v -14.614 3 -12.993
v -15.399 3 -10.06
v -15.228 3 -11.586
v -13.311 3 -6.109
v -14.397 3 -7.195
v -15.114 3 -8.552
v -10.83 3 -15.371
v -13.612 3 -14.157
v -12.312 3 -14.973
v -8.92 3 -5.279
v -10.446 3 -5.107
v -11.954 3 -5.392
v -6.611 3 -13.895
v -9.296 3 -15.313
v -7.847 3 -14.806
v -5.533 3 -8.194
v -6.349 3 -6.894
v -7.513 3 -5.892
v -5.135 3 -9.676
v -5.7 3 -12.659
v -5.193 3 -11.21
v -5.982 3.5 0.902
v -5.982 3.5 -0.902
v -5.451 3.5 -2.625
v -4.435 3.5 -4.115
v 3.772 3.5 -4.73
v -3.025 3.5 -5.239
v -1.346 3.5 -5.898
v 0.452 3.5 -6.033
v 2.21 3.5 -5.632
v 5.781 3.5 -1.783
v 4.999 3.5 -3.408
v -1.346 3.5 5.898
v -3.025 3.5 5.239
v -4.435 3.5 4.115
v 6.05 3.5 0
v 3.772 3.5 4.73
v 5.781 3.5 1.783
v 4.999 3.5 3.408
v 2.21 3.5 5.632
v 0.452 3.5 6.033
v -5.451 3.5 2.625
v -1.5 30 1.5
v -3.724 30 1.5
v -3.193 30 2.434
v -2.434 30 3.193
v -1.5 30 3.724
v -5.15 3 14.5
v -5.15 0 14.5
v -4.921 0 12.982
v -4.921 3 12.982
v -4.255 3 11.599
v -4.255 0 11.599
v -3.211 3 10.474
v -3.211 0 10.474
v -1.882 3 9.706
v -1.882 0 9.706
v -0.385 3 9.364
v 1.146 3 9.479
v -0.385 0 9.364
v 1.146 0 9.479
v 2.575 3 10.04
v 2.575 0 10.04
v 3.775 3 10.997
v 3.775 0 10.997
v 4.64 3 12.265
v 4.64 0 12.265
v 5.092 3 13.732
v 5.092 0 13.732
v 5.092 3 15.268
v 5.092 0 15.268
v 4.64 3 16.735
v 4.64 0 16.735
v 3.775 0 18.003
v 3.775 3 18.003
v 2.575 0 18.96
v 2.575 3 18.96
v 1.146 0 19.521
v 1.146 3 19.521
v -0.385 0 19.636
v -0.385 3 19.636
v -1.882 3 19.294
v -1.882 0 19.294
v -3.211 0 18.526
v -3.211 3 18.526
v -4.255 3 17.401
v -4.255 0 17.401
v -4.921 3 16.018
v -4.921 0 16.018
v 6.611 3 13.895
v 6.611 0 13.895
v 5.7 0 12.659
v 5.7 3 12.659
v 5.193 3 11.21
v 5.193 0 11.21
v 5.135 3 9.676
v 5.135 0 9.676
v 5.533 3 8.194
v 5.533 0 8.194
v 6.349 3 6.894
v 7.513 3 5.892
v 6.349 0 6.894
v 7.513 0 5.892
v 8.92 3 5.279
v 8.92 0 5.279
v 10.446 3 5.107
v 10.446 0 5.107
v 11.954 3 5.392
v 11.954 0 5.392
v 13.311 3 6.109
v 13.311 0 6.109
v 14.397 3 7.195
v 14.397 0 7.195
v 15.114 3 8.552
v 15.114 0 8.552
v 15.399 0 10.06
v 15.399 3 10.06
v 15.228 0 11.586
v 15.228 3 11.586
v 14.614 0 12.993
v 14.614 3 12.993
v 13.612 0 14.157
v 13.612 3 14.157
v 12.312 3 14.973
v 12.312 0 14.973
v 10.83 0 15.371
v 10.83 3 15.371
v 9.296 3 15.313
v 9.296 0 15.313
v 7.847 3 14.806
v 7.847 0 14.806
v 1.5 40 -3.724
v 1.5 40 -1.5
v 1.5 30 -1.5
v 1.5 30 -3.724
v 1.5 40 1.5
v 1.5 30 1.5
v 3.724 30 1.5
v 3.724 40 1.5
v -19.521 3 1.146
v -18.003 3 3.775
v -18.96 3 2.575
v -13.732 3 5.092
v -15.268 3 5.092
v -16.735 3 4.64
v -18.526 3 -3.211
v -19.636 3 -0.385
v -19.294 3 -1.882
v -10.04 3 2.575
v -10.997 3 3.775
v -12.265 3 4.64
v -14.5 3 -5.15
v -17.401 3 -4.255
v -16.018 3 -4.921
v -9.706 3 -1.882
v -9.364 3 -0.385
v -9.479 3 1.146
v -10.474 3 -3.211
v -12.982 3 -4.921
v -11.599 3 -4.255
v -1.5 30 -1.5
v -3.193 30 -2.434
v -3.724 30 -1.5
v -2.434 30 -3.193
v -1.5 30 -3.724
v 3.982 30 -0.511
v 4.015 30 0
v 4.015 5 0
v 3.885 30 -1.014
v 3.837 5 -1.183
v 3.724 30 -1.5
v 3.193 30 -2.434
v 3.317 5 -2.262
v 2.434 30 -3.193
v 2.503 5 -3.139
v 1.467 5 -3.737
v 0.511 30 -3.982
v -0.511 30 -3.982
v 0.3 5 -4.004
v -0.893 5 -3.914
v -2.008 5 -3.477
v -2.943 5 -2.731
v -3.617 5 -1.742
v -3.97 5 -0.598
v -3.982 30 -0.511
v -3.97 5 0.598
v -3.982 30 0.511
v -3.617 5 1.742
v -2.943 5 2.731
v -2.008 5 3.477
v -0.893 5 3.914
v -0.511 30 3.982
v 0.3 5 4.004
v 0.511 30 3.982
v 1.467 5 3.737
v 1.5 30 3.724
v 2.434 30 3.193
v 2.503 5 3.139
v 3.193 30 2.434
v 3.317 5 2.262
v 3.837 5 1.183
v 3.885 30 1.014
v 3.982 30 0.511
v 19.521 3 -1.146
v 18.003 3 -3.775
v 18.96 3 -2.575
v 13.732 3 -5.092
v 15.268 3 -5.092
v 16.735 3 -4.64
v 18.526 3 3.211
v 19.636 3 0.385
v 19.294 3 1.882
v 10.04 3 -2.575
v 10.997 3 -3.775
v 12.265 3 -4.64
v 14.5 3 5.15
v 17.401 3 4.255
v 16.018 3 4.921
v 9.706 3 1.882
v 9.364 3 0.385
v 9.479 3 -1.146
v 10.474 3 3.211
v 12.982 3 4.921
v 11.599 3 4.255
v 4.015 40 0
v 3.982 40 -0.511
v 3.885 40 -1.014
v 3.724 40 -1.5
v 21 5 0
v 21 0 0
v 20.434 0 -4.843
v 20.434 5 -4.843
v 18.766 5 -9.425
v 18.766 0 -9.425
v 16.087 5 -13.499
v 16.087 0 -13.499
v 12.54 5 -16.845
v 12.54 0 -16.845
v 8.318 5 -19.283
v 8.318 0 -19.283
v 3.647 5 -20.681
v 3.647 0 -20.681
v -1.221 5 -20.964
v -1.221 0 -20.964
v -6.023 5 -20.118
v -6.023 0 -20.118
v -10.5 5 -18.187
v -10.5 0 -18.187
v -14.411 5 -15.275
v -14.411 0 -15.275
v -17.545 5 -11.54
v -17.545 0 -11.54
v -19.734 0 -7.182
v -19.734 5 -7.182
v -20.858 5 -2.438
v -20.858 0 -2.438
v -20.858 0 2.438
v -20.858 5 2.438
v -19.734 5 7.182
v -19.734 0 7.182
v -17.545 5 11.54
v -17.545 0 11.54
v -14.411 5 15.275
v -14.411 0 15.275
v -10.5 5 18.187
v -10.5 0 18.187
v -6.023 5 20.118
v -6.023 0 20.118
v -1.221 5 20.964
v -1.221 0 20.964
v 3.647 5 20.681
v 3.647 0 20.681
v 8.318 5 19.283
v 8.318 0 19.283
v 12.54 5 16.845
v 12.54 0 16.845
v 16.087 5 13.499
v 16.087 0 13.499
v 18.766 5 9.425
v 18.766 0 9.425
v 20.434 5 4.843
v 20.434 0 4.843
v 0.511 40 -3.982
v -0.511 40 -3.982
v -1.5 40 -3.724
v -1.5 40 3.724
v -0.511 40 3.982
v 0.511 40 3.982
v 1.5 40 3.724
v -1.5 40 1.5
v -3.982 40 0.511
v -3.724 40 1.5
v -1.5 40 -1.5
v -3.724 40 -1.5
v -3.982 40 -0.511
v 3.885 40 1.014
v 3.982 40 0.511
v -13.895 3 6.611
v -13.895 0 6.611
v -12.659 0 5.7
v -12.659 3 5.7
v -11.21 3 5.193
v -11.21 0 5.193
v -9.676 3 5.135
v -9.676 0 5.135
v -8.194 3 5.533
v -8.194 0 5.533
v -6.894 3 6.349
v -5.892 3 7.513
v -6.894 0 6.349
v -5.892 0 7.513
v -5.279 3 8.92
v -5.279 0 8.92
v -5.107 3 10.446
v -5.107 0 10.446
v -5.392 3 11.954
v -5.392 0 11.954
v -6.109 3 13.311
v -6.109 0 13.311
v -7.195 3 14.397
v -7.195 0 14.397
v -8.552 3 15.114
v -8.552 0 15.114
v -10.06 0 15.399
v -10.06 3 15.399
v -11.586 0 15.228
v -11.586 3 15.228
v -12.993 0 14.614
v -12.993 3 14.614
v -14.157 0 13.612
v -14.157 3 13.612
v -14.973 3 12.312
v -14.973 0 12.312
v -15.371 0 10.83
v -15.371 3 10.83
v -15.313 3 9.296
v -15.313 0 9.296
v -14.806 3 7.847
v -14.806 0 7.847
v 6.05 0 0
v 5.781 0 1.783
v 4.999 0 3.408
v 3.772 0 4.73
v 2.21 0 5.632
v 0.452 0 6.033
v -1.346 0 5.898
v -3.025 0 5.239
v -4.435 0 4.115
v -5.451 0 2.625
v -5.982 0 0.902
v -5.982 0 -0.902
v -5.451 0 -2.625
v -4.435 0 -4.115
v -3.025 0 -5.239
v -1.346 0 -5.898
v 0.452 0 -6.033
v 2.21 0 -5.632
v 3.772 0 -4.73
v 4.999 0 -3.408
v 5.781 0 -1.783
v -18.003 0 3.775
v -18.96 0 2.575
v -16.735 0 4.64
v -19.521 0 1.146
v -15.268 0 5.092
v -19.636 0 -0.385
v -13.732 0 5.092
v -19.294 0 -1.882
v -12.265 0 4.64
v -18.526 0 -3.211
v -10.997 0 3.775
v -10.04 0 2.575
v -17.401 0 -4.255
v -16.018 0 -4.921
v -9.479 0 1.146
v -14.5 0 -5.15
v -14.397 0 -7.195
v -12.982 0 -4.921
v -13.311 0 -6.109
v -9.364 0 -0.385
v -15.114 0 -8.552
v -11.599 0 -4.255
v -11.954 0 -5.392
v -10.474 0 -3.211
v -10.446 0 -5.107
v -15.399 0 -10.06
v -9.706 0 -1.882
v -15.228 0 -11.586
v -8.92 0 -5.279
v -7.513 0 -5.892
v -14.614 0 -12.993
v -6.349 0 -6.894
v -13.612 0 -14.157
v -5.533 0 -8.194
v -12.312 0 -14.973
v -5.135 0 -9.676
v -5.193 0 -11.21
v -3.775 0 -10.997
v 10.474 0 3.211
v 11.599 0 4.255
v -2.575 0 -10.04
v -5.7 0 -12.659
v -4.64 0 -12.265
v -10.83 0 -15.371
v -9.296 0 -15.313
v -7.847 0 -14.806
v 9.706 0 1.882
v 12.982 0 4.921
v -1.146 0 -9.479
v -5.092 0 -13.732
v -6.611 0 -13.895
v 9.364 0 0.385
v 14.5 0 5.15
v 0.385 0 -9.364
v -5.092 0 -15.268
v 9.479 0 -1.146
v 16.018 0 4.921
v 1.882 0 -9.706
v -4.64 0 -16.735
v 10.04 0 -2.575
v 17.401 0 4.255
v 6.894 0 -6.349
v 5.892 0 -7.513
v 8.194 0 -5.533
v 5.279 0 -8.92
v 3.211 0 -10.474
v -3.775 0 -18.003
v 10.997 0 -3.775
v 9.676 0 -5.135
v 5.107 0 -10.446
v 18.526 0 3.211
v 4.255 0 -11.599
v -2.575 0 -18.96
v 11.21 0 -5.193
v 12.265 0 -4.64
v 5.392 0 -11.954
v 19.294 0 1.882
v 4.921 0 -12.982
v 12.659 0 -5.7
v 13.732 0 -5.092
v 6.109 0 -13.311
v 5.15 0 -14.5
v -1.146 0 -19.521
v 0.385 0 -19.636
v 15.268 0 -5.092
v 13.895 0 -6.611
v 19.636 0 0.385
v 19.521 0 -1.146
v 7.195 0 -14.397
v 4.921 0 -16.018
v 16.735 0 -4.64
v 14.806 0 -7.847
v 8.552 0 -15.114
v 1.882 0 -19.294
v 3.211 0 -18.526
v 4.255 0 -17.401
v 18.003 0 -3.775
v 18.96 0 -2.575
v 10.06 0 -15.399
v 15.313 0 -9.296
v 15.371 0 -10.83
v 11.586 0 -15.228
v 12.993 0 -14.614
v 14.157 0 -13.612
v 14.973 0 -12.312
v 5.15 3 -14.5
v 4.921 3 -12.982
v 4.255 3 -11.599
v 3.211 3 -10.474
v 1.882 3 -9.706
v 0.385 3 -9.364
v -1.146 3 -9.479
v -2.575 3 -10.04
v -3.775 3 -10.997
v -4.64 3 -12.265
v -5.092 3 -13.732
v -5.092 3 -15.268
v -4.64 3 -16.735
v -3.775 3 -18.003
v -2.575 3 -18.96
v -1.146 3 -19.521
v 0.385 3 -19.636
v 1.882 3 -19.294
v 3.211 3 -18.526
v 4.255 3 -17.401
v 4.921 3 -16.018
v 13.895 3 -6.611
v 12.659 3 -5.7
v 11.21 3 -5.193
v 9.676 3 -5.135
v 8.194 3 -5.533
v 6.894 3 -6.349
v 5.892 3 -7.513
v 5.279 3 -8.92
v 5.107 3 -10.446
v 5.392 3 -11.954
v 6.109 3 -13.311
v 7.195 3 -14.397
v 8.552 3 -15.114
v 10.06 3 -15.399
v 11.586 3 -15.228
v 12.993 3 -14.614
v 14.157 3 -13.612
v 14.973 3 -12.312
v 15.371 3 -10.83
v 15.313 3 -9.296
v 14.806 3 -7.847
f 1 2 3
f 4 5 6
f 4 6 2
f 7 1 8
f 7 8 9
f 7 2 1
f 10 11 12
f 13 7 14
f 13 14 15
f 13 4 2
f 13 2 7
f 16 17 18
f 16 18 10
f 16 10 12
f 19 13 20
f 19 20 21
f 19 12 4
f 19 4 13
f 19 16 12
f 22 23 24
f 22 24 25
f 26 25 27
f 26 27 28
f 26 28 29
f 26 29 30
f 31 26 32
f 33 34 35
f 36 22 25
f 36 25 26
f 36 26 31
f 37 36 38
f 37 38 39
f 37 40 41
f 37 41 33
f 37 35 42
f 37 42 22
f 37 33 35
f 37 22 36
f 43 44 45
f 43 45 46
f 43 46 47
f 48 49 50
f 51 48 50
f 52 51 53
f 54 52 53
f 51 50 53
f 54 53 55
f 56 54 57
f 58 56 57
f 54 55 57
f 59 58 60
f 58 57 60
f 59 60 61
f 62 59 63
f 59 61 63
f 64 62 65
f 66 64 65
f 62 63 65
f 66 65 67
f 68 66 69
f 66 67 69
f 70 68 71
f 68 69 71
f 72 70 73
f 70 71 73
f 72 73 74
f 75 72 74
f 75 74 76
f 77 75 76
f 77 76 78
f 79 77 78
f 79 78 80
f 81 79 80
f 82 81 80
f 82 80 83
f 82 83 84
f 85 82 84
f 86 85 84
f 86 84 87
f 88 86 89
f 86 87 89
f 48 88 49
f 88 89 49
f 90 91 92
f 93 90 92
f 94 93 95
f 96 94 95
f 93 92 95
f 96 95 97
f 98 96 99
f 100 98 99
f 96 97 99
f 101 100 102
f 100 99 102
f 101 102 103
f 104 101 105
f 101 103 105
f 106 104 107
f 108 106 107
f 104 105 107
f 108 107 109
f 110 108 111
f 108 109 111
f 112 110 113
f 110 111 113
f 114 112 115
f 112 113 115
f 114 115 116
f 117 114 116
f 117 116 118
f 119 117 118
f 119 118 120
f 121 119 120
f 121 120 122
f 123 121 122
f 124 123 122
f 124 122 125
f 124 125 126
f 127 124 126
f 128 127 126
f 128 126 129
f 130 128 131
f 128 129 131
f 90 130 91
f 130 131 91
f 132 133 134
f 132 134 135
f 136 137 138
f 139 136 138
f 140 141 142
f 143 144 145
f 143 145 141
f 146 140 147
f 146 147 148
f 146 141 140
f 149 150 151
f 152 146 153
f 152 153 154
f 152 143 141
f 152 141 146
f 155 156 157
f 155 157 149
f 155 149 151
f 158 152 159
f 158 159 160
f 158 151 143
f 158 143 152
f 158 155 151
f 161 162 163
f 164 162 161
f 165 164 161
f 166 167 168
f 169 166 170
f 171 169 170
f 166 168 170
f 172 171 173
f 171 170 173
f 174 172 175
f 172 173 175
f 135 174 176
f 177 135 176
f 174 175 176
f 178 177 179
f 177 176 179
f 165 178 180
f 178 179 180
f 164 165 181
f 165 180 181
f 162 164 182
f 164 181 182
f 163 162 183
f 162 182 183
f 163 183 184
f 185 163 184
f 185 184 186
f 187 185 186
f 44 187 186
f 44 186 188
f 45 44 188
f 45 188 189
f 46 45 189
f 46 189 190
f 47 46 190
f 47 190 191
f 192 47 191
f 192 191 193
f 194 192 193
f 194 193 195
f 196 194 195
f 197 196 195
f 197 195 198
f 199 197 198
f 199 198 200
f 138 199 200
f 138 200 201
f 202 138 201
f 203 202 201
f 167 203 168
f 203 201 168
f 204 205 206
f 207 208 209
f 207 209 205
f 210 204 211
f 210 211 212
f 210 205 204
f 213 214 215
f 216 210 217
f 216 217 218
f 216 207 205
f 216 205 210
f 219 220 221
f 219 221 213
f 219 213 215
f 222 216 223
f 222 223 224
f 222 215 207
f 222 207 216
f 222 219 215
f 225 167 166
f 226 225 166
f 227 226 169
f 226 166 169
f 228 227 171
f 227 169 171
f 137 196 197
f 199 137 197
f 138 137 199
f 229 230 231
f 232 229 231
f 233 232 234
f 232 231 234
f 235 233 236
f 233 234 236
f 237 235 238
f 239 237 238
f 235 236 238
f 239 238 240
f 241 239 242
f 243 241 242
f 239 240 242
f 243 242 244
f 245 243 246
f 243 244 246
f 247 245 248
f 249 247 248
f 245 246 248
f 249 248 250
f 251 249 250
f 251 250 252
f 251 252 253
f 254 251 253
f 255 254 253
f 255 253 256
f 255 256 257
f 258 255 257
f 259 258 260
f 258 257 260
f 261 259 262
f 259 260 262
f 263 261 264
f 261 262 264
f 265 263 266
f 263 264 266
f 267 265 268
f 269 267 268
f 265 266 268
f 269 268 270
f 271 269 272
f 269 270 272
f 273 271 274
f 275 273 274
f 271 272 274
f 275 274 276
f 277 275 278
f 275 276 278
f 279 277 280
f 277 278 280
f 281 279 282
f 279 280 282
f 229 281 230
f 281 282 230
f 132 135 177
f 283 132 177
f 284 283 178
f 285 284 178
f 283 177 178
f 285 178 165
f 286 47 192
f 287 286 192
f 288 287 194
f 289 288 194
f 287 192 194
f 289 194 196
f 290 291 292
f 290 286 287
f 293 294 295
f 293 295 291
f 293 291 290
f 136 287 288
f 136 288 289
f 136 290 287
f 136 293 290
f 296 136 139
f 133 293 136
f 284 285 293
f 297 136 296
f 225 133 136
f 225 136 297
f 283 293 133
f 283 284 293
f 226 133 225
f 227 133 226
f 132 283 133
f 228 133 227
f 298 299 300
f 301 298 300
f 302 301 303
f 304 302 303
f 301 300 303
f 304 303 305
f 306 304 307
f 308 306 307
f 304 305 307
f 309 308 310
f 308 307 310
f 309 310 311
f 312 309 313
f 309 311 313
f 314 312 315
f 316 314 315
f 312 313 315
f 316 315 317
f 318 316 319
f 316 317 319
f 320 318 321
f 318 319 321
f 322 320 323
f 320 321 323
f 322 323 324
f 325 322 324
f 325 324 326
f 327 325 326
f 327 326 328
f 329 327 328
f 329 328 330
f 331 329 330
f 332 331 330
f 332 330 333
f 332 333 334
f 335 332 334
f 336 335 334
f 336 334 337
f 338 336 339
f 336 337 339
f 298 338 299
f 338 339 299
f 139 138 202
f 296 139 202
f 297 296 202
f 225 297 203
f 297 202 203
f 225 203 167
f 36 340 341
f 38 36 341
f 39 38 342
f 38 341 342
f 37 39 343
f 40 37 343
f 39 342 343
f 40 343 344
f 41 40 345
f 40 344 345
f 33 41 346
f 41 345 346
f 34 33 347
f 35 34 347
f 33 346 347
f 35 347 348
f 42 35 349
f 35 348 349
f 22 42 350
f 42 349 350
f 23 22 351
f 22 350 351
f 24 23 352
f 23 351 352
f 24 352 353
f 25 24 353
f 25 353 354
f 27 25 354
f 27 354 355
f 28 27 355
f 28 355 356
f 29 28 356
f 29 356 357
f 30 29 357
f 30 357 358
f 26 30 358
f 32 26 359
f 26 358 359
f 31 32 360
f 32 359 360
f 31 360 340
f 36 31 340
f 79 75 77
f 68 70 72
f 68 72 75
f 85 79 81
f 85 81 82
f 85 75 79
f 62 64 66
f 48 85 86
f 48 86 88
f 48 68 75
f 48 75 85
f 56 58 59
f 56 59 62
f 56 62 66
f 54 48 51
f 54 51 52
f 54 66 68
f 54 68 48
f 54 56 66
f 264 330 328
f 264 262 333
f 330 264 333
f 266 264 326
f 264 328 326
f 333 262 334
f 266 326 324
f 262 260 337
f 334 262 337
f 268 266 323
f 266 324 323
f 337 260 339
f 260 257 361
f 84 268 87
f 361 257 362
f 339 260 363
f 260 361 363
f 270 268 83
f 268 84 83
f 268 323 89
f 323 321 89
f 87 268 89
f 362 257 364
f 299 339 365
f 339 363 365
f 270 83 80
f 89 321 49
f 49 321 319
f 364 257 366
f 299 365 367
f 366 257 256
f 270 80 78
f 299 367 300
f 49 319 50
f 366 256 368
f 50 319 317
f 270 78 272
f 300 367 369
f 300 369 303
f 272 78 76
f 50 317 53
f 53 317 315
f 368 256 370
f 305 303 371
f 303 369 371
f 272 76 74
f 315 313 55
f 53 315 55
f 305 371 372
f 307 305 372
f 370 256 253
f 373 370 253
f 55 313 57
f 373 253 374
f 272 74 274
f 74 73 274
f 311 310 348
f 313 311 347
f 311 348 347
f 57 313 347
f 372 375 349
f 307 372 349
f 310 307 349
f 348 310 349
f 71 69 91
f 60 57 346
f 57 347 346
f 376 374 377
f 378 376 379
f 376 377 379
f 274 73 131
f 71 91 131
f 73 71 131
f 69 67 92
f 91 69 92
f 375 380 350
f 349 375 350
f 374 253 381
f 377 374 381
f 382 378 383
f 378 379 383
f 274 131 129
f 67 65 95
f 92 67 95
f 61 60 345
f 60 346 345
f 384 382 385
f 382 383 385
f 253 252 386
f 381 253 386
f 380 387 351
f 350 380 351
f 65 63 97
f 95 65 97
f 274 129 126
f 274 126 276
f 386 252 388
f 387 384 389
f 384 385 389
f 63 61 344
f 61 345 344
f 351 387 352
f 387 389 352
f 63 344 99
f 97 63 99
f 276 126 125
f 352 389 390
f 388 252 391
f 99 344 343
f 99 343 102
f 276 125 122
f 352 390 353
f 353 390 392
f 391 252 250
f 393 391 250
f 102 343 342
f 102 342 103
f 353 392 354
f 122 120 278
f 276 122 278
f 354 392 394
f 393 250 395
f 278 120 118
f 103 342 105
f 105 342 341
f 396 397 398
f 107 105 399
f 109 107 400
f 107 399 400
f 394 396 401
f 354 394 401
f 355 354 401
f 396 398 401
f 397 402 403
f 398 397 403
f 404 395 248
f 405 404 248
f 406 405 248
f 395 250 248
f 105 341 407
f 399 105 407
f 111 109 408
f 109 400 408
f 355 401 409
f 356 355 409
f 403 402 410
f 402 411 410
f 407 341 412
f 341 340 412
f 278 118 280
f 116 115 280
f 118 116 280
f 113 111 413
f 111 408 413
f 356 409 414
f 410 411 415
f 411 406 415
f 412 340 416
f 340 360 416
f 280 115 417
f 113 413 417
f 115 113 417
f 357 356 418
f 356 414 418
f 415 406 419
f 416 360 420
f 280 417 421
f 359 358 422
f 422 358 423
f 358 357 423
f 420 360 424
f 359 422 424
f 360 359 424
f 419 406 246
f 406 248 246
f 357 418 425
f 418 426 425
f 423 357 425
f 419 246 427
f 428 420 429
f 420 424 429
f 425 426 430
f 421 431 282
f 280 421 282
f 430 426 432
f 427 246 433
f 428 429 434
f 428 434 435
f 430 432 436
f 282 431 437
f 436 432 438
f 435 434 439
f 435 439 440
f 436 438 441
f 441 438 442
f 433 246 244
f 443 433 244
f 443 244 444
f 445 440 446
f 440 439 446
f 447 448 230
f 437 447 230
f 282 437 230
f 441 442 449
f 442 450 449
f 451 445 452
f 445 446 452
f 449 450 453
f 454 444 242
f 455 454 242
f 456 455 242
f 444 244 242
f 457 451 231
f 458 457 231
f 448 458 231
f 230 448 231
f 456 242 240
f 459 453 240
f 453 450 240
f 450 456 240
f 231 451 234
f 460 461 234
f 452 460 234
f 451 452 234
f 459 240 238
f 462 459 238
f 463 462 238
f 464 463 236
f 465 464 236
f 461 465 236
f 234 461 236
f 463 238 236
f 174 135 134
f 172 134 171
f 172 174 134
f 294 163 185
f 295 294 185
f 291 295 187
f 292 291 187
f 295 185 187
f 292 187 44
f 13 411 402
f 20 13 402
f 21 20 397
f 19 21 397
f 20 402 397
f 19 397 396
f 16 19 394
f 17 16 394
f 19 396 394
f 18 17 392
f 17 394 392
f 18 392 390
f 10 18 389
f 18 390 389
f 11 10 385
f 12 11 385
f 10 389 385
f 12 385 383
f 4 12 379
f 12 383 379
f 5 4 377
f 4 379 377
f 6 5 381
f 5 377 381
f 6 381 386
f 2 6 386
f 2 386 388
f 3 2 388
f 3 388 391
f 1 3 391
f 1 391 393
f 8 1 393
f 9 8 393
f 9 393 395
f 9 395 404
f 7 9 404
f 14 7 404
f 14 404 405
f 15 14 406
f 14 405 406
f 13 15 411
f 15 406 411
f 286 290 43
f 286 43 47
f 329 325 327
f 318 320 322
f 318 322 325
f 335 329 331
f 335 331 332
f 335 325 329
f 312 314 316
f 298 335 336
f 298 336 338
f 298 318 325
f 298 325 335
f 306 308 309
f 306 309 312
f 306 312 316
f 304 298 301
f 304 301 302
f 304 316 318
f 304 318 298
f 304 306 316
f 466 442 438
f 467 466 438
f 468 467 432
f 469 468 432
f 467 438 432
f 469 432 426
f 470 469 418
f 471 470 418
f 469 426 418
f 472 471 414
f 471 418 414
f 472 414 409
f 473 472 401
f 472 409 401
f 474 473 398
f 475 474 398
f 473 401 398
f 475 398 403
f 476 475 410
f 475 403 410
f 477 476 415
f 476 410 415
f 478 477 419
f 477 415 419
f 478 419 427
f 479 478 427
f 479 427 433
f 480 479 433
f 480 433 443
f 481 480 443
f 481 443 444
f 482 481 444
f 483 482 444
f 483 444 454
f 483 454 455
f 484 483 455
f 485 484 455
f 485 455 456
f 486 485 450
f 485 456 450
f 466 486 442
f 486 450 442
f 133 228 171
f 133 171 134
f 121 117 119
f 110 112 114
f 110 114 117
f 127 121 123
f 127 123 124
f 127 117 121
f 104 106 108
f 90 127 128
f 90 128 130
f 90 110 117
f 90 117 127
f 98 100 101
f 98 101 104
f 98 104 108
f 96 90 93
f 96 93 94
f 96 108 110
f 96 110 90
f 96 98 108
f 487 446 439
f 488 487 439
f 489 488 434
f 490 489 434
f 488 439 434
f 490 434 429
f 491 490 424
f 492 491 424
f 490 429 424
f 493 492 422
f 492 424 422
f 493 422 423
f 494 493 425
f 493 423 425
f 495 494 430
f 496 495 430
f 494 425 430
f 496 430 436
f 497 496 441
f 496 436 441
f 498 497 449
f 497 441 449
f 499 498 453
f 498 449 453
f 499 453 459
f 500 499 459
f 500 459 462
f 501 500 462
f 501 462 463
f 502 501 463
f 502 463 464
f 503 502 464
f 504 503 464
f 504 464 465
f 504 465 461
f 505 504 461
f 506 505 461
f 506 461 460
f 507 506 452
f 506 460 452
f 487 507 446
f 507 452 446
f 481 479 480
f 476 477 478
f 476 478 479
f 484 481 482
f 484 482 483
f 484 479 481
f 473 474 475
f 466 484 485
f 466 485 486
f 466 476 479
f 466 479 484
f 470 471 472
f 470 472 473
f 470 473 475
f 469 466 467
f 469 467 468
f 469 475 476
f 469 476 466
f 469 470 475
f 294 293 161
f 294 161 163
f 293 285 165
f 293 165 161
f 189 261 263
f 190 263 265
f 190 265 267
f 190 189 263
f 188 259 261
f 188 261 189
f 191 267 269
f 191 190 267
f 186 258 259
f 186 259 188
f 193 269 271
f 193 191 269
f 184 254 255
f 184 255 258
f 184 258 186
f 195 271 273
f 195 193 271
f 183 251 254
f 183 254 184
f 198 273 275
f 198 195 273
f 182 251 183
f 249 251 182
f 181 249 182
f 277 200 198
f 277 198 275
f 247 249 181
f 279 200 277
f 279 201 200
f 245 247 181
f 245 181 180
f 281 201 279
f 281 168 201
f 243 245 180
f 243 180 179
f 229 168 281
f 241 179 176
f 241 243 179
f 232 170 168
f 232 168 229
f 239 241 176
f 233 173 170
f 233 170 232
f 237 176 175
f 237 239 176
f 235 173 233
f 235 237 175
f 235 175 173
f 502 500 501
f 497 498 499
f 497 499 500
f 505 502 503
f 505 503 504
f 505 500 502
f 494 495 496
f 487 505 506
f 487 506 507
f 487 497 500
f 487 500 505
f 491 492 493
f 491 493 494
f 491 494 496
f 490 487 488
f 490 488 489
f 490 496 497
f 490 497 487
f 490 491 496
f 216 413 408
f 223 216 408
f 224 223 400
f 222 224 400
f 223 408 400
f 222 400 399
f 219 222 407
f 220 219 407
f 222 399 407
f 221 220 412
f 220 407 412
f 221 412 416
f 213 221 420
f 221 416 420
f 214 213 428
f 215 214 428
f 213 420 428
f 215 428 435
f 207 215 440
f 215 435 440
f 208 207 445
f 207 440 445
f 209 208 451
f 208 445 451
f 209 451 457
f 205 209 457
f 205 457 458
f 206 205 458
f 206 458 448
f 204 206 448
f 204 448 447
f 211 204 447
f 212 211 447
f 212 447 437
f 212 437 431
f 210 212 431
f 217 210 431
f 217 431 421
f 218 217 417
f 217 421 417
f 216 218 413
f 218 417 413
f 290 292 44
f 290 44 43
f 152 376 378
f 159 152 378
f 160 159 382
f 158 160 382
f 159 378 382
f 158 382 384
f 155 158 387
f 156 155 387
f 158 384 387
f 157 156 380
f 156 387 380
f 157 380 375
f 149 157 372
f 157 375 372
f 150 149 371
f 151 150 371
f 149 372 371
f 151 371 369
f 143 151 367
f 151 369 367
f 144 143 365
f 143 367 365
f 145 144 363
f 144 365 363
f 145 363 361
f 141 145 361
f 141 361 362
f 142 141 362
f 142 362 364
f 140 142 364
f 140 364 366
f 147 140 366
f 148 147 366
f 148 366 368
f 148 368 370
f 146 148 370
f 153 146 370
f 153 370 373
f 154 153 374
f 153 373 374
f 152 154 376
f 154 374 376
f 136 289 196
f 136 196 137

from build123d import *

# Parameters (mm, degrees)
SKETCH_1_R               = 21
EXTRUDE_1_DEPTH          = 5
SKETCH_3_R               = 6.05
CUT_EXTRUDE_2_DEPTH      = 3.5
SKETCH_4_R               = 4.015
EXTRUDE_2_DEPTH          = 25
SKETCH_12_R              = 5.15
CUT_EXTRUDE_6_DEPTH      = 3
PATTERN_CIRCULAR_1_COUNT = 8
SKETCH_13_W              = 3
SKETCH_13_H              = 3
EXTRUDE_3_DEPTH          = 10


with BuildPart() as part:
    # 스케치1 → 보스-돌출1 (new body)
    with BuildSketch(Plane(origin=(0, 0, 0), x_dir=(1, 0, 0), z_dir=(0, 1, 0))):
        Circle(SKETCH_1_R)
    extrude(amount=EXTRUDE_1_DEPTH)

    # 스케치3 → 컷-돌출2 (cut)
    with BuildSketch(Plane.XZ):
        Circle(SKETCH_3_R)
    extrude(amount=-CUT_EXTRUDE_2_DEPTH, mode=Mode.SUBTRACT)

    # 스케치4 → 보스-돌출2 (add)
    with BuildSketch(Plane(origin=(0, 5, 0), x_dir=(1, 0, 0), z_dir=(0, 1, 0))):
        Circle(SKETCH_4_R)
    extrude(amount=EXTRUDE_2_DEPTH)

    # 스케치12 → 컷-돌출6 (cut)
    with BuildSketch(Plane.XZ):
        with Locations((0, -14.5)):
            Circle(SKETCH_12_R)
    cut_extrude_6 = extrude(amount=-CUT_EXTRUDE_6_DEPTH, mode=Mode.SUBTRACT)

    # 원형 패턴1: 컷-돌출6 ×8 about axis
    pattern_circular_1_axis = Axis((0, 0, 0), (0, 1, 0))
    for i in range(1, PATTERN_CIRCULAR_1_COUNT):
        add(cut_extrude_6.rotate(pattern_circular_1_axis, i * 360 / PATTERN_CIRCULAR_1_COUNT), mode=Mode.SUBTRACT)

    # 스케치13 → 보스-돌출3 (add)
    with BuildSketch(Plane(origin=(0, 30, 0), x_dir=(1, 0, 0), z_dir=(0, 1, 0))):
        with BuildLine():
            ThreePointArc((1.5, 3.724275097), (0, 4.015), (-1.5, 3.724275097))
            Line((-1.5, 3.724275097), (-1.5, 1.5))
            Line((-1.5, 1.5), (1.5, 1.5))
            Line((1.5, 1.5), (1.5, 3.724275097))
        make_face()
        with BuildLine():
            Line((-1.5, -1.5), (-1.5, 1.5))
            Line((-1.5, 1.5), (-3.724275097, 1.5))
            ThreePointArc((-3.724275097, 1.5), (-4.015, 0), (-3.724275097, -1.5))
            Line((-3.724275097, -1.5), (-1.5, -1.5))
        make_face()
        Rectangle(SKETCH_13_W, SKETCH_13_H)
        with BuildLine():
            Line((1.5, -1.5), (-1.5, -1.5))
            Line((-1.5, -1.5), (-1.5, -3.724275097))
            ThreePointArc((-1.5, -3.724275097), (0, -4.015), (1.5, -3.724275097))
            Line((1.5, -3.724275097), (1.5, -1.5))
        make_face()
        with BuildLine():
            Line((3.724275097, 1.5), (1.5, 1.5))
            Line((1.5, 1.5), (1.5, -1.5))
            Line((1.5, -1.5), (3.724275097, -1.5))
            ThreePointArc((3.724275097, -1.5), (3.941648736, -0.763956964), (4.015, 0))
            ThreePointArc((4.015, 0), (3.941648736, 0.763956964), (3.724275097, 1.5))
        make_face()
    extrude(amount=EXTRUDE_3_DEPTH)


solid = part.part
